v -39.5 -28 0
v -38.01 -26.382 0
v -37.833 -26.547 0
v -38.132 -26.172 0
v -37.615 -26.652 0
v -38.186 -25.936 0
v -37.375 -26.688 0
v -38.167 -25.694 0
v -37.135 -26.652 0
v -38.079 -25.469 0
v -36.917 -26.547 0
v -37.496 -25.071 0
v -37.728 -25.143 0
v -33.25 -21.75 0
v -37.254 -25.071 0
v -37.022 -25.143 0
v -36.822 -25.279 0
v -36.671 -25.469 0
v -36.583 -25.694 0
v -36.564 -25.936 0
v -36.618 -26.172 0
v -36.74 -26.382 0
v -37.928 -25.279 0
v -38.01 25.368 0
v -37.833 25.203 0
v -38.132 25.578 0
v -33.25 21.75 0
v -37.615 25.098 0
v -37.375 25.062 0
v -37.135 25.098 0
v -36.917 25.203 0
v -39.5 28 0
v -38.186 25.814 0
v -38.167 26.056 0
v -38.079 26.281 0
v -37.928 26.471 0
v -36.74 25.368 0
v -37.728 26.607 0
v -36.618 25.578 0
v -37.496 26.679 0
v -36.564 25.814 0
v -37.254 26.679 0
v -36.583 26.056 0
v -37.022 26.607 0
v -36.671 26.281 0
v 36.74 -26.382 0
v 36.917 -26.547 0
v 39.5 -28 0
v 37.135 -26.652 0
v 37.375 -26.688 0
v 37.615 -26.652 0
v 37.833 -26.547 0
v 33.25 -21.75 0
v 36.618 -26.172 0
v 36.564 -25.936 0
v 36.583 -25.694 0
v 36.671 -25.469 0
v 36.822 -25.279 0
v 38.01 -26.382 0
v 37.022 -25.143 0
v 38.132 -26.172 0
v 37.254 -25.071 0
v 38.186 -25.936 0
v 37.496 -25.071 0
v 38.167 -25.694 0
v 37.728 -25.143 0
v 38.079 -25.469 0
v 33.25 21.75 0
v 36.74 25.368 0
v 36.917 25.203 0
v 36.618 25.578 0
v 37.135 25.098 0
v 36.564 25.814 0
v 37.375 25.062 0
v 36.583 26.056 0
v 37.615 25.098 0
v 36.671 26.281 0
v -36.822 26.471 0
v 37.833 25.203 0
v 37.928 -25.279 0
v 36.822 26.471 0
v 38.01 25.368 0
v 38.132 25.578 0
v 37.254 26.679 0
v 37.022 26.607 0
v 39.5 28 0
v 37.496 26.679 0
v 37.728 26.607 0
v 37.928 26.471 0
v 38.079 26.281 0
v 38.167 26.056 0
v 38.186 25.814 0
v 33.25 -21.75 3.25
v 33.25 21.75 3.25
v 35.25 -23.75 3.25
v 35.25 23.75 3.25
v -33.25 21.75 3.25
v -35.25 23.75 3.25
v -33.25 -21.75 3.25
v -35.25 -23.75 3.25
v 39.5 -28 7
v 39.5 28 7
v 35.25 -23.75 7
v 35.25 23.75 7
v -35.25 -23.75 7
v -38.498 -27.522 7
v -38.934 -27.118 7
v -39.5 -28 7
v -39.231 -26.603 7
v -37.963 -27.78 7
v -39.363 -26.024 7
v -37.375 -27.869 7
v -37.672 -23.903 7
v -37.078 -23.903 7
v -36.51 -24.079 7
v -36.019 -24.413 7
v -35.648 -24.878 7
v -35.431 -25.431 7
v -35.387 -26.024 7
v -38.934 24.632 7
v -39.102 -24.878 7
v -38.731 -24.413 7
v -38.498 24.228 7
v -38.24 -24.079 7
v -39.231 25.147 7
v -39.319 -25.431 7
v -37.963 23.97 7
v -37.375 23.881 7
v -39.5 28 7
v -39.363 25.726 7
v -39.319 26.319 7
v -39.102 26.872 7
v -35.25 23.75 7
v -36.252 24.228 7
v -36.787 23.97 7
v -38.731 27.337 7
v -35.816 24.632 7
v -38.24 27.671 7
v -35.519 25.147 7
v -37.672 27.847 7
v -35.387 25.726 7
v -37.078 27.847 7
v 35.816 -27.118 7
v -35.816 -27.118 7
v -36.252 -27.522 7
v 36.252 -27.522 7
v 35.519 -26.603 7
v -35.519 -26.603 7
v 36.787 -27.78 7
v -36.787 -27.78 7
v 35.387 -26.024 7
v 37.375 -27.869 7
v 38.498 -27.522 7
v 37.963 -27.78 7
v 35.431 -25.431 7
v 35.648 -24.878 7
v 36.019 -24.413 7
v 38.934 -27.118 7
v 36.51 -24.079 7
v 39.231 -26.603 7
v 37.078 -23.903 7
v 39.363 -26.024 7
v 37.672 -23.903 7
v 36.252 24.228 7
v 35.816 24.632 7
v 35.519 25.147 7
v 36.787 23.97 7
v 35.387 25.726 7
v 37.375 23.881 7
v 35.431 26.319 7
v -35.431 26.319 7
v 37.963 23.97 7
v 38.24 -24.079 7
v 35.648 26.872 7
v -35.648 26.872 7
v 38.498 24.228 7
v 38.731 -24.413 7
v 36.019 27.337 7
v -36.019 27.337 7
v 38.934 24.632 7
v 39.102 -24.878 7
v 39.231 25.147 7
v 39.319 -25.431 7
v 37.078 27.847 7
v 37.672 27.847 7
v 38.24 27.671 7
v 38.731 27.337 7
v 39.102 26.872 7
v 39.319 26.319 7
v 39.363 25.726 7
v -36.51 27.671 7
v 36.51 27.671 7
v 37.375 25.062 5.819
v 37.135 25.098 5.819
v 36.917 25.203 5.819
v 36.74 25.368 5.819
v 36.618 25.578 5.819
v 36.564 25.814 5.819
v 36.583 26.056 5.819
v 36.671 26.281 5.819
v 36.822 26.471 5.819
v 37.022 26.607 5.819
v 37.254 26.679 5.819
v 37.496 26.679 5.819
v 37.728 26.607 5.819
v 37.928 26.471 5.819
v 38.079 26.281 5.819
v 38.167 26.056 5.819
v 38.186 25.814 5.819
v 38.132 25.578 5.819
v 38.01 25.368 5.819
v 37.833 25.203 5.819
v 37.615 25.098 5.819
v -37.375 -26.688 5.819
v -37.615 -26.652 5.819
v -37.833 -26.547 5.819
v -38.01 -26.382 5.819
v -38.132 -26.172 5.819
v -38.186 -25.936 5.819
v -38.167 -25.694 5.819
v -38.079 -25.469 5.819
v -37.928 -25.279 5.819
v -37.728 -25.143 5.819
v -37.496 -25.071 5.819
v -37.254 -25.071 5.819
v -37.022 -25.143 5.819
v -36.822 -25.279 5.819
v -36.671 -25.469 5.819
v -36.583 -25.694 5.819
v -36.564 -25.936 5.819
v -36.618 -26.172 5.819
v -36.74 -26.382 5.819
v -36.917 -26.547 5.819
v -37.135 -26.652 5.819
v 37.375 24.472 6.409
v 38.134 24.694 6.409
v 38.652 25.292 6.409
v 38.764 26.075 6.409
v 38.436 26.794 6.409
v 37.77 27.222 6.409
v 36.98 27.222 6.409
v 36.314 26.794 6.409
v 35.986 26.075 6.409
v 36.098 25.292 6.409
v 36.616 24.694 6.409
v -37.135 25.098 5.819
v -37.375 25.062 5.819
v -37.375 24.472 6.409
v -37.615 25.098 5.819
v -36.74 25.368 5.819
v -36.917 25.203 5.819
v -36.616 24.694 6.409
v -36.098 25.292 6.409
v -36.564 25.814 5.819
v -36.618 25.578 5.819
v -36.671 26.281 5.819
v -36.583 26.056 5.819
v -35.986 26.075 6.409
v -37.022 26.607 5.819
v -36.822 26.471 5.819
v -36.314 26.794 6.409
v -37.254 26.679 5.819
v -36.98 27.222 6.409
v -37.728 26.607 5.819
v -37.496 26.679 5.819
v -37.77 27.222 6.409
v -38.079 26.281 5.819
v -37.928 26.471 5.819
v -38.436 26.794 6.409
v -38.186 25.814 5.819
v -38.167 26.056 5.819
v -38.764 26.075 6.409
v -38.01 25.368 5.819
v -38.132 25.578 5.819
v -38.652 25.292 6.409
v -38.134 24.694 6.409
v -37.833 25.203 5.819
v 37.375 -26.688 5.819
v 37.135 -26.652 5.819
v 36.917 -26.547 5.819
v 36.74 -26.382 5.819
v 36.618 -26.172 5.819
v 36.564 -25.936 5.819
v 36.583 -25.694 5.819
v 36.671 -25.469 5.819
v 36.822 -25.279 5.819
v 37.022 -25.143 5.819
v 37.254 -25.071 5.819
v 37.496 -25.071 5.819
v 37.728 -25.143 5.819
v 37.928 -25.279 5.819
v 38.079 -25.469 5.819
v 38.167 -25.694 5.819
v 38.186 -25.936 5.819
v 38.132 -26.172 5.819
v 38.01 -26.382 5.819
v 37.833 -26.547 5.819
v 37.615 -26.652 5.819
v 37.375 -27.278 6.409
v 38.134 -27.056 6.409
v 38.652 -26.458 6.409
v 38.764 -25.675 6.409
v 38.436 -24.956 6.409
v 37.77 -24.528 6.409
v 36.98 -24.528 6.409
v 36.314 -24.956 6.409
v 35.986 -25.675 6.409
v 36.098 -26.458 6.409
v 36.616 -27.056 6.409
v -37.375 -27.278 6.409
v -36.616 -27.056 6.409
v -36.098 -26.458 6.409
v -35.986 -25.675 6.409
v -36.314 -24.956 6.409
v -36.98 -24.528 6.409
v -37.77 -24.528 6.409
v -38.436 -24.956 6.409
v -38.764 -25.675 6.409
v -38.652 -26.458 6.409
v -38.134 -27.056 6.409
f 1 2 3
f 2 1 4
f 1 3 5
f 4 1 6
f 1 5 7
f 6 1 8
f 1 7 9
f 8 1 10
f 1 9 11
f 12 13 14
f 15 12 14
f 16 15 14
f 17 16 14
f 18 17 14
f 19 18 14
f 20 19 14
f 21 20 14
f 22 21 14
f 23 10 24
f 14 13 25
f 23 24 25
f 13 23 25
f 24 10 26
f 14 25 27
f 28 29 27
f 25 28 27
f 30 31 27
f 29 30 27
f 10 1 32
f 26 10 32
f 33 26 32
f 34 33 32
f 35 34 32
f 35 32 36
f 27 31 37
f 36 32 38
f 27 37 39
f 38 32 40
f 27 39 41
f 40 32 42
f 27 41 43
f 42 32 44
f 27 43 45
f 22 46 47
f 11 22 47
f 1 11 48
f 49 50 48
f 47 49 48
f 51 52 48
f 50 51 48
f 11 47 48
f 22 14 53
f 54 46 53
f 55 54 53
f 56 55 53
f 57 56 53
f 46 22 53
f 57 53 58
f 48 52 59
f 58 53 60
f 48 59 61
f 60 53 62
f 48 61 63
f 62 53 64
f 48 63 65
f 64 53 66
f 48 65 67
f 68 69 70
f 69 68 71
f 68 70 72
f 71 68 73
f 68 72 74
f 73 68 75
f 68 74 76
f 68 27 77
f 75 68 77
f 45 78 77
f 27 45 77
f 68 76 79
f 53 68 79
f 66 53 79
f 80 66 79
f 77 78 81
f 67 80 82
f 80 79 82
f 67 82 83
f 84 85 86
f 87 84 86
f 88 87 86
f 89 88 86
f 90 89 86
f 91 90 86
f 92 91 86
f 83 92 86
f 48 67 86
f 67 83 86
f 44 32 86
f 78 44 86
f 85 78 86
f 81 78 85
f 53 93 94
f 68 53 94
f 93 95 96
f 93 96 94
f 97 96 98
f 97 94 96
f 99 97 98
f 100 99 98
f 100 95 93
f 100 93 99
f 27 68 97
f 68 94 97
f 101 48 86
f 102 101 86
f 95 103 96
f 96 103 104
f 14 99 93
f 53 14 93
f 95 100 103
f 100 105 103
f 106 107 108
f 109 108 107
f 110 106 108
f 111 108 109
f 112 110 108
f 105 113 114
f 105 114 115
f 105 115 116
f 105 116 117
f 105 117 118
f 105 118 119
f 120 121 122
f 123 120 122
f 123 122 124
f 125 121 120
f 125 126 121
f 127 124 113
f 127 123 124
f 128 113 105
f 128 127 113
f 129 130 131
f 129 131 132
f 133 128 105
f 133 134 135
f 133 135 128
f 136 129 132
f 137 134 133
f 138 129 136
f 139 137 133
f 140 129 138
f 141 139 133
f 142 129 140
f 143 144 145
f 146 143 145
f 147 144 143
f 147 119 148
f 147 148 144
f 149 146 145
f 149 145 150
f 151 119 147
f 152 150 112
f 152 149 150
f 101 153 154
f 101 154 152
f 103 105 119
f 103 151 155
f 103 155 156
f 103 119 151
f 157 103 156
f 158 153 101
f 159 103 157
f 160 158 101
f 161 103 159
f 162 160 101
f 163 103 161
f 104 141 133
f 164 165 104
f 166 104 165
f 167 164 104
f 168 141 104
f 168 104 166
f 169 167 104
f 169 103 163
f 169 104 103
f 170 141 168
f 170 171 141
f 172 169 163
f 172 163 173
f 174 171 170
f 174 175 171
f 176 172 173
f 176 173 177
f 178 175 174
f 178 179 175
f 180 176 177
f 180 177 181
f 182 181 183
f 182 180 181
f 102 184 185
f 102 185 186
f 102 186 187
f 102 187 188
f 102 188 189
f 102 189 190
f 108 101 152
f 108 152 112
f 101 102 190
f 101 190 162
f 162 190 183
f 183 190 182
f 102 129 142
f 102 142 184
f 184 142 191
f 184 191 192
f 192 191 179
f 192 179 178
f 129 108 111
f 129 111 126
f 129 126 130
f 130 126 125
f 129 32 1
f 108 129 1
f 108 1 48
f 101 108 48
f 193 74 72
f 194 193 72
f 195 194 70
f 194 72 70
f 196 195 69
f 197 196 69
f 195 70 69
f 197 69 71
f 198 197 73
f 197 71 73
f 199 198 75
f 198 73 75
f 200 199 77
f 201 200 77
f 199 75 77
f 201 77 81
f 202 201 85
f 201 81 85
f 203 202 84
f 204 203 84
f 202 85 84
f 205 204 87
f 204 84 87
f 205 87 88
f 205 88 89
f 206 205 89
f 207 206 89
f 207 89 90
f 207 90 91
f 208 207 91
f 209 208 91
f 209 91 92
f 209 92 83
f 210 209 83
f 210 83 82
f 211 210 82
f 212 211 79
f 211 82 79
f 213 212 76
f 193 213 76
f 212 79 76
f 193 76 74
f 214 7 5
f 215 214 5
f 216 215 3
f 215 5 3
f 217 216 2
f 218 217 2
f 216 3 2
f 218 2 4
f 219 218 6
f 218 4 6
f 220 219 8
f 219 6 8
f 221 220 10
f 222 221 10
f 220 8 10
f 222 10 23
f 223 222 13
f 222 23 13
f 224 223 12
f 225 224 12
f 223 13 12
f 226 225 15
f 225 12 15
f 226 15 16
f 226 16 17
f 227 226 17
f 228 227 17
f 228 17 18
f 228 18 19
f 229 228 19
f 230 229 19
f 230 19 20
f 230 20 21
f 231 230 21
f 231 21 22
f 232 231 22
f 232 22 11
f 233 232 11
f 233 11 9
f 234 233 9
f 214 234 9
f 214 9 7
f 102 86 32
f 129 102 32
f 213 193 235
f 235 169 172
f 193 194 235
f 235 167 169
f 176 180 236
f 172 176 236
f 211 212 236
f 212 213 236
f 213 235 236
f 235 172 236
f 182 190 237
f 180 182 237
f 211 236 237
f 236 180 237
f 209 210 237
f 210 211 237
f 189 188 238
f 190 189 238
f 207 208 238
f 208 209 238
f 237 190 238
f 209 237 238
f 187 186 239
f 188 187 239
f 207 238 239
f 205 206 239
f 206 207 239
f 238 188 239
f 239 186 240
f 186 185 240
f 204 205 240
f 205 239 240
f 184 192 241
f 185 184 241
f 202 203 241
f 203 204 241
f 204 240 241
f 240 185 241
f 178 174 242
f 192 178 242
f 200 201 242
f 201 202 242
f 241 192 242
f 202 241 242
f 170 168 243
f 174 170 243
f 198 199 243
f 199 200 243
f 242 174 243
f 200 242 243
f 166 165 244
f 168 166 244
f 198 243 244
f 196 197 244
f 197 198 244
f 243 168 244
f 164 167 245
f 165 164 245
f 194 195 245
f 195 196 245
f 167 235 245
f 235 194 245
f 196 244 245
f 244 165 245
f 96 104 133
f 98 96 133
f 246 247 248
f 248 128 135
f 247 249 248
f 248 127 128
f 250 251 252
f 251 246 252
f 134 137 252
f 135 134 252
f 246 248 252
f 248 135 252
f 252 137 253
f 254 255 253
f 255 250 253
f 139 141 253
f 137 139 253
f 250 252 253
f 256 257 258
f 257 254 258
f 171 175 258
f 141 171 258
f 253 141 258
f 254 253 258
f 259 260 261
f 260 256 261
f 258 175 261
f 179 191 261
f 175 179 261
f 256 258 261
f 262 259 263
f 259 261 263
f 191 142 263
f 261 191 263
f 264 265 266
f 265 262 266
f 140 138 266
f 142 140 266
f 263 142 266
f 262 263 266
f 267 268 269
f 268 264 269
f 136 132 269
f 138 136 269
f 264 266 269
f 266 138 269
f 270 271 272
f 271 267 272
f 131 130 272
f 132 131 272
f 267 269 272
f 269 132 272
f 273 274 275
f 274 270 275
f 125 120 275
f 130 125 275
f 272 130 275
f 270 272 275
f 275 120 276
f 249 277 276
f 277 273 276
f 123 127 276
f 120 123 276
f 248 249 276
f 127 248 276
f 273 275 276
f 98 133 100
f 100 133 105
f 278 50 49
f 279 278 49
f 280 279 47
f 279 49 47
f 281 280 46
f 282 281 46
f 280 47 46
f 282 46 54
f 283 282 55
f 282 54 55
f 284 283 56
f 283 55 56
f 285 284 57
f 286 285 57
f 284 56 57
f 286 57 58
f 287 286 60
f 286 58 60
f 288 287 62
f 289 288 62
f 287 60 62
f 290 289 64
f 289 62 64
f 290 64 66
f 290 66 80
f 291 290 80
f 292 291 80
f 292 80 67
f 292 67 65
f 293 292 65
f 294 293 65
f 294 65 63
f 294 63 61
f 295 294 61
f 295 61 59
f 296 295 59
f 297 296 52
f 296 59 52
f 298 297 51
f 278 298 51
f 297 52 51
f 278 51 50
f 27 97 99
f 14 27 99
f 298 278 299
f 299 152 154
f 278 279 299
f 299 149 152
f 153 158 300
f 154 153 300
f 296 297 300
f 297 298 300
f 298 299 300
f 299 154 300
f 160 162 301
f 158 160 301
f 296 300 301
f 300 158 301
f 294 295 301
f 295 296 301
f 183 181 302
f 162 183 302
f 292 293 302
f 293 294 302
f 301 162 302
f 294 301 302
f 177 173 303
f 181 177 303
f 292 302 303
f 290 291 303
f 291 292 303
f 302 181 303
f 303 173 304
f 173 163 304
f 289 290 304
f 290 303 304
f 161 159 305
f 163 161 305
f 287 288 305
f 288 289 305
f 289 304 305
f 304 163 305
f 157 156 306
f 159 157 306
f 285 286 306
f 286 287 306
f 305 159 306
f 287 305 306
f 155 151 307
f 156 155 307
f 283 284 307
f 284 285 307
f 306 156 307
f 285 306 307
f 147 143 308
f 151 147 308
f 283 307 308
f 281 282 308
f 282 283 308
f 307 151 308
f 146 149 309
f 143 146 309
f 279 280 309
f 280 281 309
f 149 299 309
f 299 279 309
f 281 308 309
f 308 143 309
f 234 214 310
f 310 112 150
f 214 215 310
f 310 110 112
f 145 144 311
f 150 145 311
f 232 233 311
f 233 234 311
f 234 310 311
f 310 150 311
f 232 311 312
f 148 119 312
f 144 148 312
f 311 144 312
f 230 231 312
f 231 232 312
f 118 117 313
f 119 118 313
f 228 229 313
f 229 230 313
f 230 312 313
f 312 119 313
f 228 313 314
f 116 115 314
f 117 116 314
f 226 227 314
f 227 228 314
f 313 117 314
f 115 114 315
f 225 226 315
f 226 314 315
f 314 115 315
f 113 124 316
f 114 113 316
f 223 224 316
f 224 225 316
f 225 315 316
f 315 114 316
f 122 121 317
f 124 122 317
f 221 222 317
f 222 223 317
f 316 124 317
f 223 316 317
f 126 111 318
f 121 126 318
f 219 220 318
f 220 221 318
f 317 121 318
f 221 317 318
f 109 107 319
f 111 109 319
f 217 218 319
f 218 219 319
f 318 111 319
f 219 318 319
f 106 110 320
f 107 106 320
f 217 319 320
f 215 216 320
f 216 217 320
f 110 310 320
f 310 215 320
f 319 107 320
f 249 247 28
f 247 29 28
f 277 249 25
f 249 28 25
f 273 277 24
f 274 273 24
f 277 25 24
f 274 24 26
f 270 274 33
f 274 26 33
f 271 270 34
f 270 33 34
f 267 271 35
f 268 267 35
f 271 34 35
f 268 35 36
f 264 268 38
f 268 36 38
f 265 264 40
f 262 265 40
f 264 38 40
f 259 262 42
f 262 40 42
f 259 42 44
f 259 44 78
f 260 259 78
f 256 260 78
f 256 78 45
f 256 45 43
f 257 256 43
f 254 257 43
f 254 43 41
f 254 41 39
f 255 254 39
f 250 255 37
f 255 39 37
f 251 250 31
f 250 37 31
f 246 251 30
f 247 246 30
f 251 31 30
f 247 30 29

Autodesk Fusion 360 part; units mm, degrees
sketch "Sketch1" plane through (0, 0, 0) normal (0, 0, 1) x (1, 0, 0)
  line L0 (39.5, 28) -> (-39.5, 28)
  line L1 (-39.5, 28) -> (-39.5, -28)
  line L2 (-39.5, -28) -> (39.5, -28)
  line L3 (39.5, -28) -> (39.5, 28)
  line L4 (39.5, 28) -> (-39.5, -28) construction
  line L5 (-39.5, 28) -> (39.5, -28) construction
  dimension "d1" = 79
  dimension "d2" = 56
extrude "Extrude1" add sketch "Sketch1" along normal blind 7
sketch "Sketch2" plane through (0, 0, 7) normal (0, 0, 1) x (-1, 0, 0)
  line L0 (-39.5, 28) -> (-39.5, -28)
  line L1 (-39.5, -28) -> (39.5, -28)
  line L2 (39.5, -28) -> (39.5, 28)
  line L3 (39.5, 28) -> (-39.5, 28)
  line L4 (-35.25, -23.75) -> (35.25, -23.75)
  line L5 (35.25, -23.75) -> (35.25, 23.75)
  line L6 (35.25, 23.75) -> (-35.25, 23.75)
  line L7 (-35.25, 23.75) -> (-35.25, -23.75)
  line L8 (-35.25, -23.75) -> (35.25, 23.75) construction
  line L9 (35.25, -23.75) -> (-35.25, 23.75) construction
  dimension "d5" = 70.5
  dimension "d6" = 47.5
extrude "Extrude2" cut sketch "Sketch2" against normal blind 3.75 contours L4 L5 L6 L7
sketch "Sketch3" plane through (0, 0, 3.25) normal (0, 0, 1) x (-1, 0, 0)
  line L0 (-35.25, 23.75) -> (-35.25, -23.75)
  line L1 (-35.25, -23.75) -> (35.25, -23.75)
  line L2 (35.25, -23.75) -> (35.25, 23.75)
  line L3 (35.25, 23.75) -> (-35.25, 23.75)
  line L4 (33.25, 21.75) -> (-33.25, 21.75)
  line L5 (-33.25, 21.75) -> (-33.25, -21.75)
  line L6 (-33.25, -21.75) -> (33.25, -21.75)
  line L7 (33.25, -21.75) -> (33.25, 21.75)
  line L8 (33.25, 21.75) -> (-33.25, -21.75) construction
  line L9 (-33.25, 21.75) -> (33.25, -21.75) construction
  dimension "d9" = 66.5
  dimension "d10" = 43.5
extrude "Extrude3" cut sketch "Sketch3" against normal blind 3.25 contours L4 L5 L6 L7
sketch "Sketch4" plane through (0, 0, 7) normal (0, 0, 1) x (-1, 0, 0)
  line L0 (35.25, -23.75) -> (-35.25, -23.75)
  line L1 (-35.25, -23.75) -> (-35.25, 23.75)
  line L2 (-35.25, 23.75) -> (35.25, 23.75)
  line L3 (35.25, 23.75) -> (35.25, -23.75)
  line L4 (-39.5, 28) -> (-39.5, -28)
  line L5 (-39.5, -28) -> (39.5, -28)
  line L6 (39.5, -28) -> (39.5, 28)
  line L7 (39.5, 28) -> (-39.5, 28)
  circle A0 centre (37.375, -25.875) radius 2
  dimension "d13" = 4
  dimension "d14" = 2.125
  dimension "d15" = 2.125
sketch "Sketch5" plane through (0, 0, 7) normal (0, 0, 1) x (-1, 0, 0)
  line L0 (35.25, -23.75) -> (-35.25, -23.75)
  line L1 (-35.25, -23.75) -> (-35.25, 23.75)
  line L2 (-35.25, 23.75) -> (35.25, 23.75)
  line L3 (35.25, 23.75) -> (35.25, -23.75)
  line L4 (-39.5, 28) -> (-39.5, -28)
  line L5 (-39.5, -28) -> (39.5, -28)
  line L6 (39.5, -28) -> (39.5, 28)
  line L7 (39.5, 28) -> (-39.5, 28)
  circle A0 centre (-37.375, -25.875) radius 2
  circle A1 centre (-37.375, 25.875) radius 2
  circle A2 centre (37.375, 25.875) radius 2
  dimension "d23" = 4
  dimension "d24" = 2.125
  dimension "d25" = 2.125
  dimension "d26" = 4
  dimension "d27" = 2.125
  dimension "d28" = 2.125
  dimension "d29" = 4
  dimension "d30" = 2.125
  dimension "d31" = 2.125
hole "Hole2" at (37.375, 25.875, 7) at (37.375, -25.875, 7) at (-37.375, -25.875, 7) direction (0, 0, -1) diameter 1.6256 depth 7.0104 tip angle 180 countersink diameter 3.9878 countersink angle 90
sketch "Sketch6" plane through (0, 0, 7) normal (0, 0, 1) x (-1, 0, 0)
  circle A0 centre (-37.375, 25.875) radius 1.9939
  circle A1 centre (-37.375, -25.875) radius 1.9939
  circle A2 centre (37.375, 25.875) radius 1.9939
  line L0 (35.25, -23.75) -> (-35.25, -23.75)
  line L1 (-35.25, -23.75) -> (-35.25, 23.75)
  line L2 (-35.25, 23.75) -> (35.25, 23.75)
  line L3 (35.25, 23.75) -> (35.25, -23.75)
  line L4 (-39.5, 28) -> (-39.5, -28)
  line L5 (-39.5, -28) -> (39.5, -28)
  line L6 (39.5, -28) -> (39.5, 28)
  line L7 (39.5, 28) -> (-39.5, 28)
  circle A3 centre (37.375, -25.875) radius 2
  dimension "d39" = 4
  dimension "d40" = 2.125
  dimension "d41" = 2.125
hole "Hole3" at (-37.375, 25.875, 7) direction (0, 0, -1) diameter 1.6256 depth 7.0104 tip angle 180 countersink diameter 3.9878 countersink angle 90
sketch "Sketch7" plane through (0, 0, 3.25) normal (0, 0, 1) x (-1, 0, 0)
  line L0 (-33.25, 21.75) -> (33.25, 21.75)
  line L1 (33.25, 21.75) -> (33.25, -21.75)
  line L2 (33.25, -21.75) -> (-33.25, -21.75)
  line L3 (-33.25, -21.75) -> (-33.25, 21.75)
  line L4 (-35.25, 23.75) -> (-35.25, -23.75)
  line L5 (-35.25, -23.75) -> (35.25, -23.75)
  line L6 (35.25, -23.75) -> (35.25, 23.75)
  line L7 (35.25, 23.75) -> (-35.25, 23.75)
sketch "Sketch8" plane through (35.25, 0, 0) normal (-1, 0, 0) x (0, -1, 0)
  line L0 (23.75, 7) -> (-23.75, 7)
  line L1 (-23.75, 7) -> (-23.75, 3.25)
  line L2 (-23.75, 3.25) -> (23.75, 3.25)
  line L3 (23.75, 3.25) -> (23.75, 7)
